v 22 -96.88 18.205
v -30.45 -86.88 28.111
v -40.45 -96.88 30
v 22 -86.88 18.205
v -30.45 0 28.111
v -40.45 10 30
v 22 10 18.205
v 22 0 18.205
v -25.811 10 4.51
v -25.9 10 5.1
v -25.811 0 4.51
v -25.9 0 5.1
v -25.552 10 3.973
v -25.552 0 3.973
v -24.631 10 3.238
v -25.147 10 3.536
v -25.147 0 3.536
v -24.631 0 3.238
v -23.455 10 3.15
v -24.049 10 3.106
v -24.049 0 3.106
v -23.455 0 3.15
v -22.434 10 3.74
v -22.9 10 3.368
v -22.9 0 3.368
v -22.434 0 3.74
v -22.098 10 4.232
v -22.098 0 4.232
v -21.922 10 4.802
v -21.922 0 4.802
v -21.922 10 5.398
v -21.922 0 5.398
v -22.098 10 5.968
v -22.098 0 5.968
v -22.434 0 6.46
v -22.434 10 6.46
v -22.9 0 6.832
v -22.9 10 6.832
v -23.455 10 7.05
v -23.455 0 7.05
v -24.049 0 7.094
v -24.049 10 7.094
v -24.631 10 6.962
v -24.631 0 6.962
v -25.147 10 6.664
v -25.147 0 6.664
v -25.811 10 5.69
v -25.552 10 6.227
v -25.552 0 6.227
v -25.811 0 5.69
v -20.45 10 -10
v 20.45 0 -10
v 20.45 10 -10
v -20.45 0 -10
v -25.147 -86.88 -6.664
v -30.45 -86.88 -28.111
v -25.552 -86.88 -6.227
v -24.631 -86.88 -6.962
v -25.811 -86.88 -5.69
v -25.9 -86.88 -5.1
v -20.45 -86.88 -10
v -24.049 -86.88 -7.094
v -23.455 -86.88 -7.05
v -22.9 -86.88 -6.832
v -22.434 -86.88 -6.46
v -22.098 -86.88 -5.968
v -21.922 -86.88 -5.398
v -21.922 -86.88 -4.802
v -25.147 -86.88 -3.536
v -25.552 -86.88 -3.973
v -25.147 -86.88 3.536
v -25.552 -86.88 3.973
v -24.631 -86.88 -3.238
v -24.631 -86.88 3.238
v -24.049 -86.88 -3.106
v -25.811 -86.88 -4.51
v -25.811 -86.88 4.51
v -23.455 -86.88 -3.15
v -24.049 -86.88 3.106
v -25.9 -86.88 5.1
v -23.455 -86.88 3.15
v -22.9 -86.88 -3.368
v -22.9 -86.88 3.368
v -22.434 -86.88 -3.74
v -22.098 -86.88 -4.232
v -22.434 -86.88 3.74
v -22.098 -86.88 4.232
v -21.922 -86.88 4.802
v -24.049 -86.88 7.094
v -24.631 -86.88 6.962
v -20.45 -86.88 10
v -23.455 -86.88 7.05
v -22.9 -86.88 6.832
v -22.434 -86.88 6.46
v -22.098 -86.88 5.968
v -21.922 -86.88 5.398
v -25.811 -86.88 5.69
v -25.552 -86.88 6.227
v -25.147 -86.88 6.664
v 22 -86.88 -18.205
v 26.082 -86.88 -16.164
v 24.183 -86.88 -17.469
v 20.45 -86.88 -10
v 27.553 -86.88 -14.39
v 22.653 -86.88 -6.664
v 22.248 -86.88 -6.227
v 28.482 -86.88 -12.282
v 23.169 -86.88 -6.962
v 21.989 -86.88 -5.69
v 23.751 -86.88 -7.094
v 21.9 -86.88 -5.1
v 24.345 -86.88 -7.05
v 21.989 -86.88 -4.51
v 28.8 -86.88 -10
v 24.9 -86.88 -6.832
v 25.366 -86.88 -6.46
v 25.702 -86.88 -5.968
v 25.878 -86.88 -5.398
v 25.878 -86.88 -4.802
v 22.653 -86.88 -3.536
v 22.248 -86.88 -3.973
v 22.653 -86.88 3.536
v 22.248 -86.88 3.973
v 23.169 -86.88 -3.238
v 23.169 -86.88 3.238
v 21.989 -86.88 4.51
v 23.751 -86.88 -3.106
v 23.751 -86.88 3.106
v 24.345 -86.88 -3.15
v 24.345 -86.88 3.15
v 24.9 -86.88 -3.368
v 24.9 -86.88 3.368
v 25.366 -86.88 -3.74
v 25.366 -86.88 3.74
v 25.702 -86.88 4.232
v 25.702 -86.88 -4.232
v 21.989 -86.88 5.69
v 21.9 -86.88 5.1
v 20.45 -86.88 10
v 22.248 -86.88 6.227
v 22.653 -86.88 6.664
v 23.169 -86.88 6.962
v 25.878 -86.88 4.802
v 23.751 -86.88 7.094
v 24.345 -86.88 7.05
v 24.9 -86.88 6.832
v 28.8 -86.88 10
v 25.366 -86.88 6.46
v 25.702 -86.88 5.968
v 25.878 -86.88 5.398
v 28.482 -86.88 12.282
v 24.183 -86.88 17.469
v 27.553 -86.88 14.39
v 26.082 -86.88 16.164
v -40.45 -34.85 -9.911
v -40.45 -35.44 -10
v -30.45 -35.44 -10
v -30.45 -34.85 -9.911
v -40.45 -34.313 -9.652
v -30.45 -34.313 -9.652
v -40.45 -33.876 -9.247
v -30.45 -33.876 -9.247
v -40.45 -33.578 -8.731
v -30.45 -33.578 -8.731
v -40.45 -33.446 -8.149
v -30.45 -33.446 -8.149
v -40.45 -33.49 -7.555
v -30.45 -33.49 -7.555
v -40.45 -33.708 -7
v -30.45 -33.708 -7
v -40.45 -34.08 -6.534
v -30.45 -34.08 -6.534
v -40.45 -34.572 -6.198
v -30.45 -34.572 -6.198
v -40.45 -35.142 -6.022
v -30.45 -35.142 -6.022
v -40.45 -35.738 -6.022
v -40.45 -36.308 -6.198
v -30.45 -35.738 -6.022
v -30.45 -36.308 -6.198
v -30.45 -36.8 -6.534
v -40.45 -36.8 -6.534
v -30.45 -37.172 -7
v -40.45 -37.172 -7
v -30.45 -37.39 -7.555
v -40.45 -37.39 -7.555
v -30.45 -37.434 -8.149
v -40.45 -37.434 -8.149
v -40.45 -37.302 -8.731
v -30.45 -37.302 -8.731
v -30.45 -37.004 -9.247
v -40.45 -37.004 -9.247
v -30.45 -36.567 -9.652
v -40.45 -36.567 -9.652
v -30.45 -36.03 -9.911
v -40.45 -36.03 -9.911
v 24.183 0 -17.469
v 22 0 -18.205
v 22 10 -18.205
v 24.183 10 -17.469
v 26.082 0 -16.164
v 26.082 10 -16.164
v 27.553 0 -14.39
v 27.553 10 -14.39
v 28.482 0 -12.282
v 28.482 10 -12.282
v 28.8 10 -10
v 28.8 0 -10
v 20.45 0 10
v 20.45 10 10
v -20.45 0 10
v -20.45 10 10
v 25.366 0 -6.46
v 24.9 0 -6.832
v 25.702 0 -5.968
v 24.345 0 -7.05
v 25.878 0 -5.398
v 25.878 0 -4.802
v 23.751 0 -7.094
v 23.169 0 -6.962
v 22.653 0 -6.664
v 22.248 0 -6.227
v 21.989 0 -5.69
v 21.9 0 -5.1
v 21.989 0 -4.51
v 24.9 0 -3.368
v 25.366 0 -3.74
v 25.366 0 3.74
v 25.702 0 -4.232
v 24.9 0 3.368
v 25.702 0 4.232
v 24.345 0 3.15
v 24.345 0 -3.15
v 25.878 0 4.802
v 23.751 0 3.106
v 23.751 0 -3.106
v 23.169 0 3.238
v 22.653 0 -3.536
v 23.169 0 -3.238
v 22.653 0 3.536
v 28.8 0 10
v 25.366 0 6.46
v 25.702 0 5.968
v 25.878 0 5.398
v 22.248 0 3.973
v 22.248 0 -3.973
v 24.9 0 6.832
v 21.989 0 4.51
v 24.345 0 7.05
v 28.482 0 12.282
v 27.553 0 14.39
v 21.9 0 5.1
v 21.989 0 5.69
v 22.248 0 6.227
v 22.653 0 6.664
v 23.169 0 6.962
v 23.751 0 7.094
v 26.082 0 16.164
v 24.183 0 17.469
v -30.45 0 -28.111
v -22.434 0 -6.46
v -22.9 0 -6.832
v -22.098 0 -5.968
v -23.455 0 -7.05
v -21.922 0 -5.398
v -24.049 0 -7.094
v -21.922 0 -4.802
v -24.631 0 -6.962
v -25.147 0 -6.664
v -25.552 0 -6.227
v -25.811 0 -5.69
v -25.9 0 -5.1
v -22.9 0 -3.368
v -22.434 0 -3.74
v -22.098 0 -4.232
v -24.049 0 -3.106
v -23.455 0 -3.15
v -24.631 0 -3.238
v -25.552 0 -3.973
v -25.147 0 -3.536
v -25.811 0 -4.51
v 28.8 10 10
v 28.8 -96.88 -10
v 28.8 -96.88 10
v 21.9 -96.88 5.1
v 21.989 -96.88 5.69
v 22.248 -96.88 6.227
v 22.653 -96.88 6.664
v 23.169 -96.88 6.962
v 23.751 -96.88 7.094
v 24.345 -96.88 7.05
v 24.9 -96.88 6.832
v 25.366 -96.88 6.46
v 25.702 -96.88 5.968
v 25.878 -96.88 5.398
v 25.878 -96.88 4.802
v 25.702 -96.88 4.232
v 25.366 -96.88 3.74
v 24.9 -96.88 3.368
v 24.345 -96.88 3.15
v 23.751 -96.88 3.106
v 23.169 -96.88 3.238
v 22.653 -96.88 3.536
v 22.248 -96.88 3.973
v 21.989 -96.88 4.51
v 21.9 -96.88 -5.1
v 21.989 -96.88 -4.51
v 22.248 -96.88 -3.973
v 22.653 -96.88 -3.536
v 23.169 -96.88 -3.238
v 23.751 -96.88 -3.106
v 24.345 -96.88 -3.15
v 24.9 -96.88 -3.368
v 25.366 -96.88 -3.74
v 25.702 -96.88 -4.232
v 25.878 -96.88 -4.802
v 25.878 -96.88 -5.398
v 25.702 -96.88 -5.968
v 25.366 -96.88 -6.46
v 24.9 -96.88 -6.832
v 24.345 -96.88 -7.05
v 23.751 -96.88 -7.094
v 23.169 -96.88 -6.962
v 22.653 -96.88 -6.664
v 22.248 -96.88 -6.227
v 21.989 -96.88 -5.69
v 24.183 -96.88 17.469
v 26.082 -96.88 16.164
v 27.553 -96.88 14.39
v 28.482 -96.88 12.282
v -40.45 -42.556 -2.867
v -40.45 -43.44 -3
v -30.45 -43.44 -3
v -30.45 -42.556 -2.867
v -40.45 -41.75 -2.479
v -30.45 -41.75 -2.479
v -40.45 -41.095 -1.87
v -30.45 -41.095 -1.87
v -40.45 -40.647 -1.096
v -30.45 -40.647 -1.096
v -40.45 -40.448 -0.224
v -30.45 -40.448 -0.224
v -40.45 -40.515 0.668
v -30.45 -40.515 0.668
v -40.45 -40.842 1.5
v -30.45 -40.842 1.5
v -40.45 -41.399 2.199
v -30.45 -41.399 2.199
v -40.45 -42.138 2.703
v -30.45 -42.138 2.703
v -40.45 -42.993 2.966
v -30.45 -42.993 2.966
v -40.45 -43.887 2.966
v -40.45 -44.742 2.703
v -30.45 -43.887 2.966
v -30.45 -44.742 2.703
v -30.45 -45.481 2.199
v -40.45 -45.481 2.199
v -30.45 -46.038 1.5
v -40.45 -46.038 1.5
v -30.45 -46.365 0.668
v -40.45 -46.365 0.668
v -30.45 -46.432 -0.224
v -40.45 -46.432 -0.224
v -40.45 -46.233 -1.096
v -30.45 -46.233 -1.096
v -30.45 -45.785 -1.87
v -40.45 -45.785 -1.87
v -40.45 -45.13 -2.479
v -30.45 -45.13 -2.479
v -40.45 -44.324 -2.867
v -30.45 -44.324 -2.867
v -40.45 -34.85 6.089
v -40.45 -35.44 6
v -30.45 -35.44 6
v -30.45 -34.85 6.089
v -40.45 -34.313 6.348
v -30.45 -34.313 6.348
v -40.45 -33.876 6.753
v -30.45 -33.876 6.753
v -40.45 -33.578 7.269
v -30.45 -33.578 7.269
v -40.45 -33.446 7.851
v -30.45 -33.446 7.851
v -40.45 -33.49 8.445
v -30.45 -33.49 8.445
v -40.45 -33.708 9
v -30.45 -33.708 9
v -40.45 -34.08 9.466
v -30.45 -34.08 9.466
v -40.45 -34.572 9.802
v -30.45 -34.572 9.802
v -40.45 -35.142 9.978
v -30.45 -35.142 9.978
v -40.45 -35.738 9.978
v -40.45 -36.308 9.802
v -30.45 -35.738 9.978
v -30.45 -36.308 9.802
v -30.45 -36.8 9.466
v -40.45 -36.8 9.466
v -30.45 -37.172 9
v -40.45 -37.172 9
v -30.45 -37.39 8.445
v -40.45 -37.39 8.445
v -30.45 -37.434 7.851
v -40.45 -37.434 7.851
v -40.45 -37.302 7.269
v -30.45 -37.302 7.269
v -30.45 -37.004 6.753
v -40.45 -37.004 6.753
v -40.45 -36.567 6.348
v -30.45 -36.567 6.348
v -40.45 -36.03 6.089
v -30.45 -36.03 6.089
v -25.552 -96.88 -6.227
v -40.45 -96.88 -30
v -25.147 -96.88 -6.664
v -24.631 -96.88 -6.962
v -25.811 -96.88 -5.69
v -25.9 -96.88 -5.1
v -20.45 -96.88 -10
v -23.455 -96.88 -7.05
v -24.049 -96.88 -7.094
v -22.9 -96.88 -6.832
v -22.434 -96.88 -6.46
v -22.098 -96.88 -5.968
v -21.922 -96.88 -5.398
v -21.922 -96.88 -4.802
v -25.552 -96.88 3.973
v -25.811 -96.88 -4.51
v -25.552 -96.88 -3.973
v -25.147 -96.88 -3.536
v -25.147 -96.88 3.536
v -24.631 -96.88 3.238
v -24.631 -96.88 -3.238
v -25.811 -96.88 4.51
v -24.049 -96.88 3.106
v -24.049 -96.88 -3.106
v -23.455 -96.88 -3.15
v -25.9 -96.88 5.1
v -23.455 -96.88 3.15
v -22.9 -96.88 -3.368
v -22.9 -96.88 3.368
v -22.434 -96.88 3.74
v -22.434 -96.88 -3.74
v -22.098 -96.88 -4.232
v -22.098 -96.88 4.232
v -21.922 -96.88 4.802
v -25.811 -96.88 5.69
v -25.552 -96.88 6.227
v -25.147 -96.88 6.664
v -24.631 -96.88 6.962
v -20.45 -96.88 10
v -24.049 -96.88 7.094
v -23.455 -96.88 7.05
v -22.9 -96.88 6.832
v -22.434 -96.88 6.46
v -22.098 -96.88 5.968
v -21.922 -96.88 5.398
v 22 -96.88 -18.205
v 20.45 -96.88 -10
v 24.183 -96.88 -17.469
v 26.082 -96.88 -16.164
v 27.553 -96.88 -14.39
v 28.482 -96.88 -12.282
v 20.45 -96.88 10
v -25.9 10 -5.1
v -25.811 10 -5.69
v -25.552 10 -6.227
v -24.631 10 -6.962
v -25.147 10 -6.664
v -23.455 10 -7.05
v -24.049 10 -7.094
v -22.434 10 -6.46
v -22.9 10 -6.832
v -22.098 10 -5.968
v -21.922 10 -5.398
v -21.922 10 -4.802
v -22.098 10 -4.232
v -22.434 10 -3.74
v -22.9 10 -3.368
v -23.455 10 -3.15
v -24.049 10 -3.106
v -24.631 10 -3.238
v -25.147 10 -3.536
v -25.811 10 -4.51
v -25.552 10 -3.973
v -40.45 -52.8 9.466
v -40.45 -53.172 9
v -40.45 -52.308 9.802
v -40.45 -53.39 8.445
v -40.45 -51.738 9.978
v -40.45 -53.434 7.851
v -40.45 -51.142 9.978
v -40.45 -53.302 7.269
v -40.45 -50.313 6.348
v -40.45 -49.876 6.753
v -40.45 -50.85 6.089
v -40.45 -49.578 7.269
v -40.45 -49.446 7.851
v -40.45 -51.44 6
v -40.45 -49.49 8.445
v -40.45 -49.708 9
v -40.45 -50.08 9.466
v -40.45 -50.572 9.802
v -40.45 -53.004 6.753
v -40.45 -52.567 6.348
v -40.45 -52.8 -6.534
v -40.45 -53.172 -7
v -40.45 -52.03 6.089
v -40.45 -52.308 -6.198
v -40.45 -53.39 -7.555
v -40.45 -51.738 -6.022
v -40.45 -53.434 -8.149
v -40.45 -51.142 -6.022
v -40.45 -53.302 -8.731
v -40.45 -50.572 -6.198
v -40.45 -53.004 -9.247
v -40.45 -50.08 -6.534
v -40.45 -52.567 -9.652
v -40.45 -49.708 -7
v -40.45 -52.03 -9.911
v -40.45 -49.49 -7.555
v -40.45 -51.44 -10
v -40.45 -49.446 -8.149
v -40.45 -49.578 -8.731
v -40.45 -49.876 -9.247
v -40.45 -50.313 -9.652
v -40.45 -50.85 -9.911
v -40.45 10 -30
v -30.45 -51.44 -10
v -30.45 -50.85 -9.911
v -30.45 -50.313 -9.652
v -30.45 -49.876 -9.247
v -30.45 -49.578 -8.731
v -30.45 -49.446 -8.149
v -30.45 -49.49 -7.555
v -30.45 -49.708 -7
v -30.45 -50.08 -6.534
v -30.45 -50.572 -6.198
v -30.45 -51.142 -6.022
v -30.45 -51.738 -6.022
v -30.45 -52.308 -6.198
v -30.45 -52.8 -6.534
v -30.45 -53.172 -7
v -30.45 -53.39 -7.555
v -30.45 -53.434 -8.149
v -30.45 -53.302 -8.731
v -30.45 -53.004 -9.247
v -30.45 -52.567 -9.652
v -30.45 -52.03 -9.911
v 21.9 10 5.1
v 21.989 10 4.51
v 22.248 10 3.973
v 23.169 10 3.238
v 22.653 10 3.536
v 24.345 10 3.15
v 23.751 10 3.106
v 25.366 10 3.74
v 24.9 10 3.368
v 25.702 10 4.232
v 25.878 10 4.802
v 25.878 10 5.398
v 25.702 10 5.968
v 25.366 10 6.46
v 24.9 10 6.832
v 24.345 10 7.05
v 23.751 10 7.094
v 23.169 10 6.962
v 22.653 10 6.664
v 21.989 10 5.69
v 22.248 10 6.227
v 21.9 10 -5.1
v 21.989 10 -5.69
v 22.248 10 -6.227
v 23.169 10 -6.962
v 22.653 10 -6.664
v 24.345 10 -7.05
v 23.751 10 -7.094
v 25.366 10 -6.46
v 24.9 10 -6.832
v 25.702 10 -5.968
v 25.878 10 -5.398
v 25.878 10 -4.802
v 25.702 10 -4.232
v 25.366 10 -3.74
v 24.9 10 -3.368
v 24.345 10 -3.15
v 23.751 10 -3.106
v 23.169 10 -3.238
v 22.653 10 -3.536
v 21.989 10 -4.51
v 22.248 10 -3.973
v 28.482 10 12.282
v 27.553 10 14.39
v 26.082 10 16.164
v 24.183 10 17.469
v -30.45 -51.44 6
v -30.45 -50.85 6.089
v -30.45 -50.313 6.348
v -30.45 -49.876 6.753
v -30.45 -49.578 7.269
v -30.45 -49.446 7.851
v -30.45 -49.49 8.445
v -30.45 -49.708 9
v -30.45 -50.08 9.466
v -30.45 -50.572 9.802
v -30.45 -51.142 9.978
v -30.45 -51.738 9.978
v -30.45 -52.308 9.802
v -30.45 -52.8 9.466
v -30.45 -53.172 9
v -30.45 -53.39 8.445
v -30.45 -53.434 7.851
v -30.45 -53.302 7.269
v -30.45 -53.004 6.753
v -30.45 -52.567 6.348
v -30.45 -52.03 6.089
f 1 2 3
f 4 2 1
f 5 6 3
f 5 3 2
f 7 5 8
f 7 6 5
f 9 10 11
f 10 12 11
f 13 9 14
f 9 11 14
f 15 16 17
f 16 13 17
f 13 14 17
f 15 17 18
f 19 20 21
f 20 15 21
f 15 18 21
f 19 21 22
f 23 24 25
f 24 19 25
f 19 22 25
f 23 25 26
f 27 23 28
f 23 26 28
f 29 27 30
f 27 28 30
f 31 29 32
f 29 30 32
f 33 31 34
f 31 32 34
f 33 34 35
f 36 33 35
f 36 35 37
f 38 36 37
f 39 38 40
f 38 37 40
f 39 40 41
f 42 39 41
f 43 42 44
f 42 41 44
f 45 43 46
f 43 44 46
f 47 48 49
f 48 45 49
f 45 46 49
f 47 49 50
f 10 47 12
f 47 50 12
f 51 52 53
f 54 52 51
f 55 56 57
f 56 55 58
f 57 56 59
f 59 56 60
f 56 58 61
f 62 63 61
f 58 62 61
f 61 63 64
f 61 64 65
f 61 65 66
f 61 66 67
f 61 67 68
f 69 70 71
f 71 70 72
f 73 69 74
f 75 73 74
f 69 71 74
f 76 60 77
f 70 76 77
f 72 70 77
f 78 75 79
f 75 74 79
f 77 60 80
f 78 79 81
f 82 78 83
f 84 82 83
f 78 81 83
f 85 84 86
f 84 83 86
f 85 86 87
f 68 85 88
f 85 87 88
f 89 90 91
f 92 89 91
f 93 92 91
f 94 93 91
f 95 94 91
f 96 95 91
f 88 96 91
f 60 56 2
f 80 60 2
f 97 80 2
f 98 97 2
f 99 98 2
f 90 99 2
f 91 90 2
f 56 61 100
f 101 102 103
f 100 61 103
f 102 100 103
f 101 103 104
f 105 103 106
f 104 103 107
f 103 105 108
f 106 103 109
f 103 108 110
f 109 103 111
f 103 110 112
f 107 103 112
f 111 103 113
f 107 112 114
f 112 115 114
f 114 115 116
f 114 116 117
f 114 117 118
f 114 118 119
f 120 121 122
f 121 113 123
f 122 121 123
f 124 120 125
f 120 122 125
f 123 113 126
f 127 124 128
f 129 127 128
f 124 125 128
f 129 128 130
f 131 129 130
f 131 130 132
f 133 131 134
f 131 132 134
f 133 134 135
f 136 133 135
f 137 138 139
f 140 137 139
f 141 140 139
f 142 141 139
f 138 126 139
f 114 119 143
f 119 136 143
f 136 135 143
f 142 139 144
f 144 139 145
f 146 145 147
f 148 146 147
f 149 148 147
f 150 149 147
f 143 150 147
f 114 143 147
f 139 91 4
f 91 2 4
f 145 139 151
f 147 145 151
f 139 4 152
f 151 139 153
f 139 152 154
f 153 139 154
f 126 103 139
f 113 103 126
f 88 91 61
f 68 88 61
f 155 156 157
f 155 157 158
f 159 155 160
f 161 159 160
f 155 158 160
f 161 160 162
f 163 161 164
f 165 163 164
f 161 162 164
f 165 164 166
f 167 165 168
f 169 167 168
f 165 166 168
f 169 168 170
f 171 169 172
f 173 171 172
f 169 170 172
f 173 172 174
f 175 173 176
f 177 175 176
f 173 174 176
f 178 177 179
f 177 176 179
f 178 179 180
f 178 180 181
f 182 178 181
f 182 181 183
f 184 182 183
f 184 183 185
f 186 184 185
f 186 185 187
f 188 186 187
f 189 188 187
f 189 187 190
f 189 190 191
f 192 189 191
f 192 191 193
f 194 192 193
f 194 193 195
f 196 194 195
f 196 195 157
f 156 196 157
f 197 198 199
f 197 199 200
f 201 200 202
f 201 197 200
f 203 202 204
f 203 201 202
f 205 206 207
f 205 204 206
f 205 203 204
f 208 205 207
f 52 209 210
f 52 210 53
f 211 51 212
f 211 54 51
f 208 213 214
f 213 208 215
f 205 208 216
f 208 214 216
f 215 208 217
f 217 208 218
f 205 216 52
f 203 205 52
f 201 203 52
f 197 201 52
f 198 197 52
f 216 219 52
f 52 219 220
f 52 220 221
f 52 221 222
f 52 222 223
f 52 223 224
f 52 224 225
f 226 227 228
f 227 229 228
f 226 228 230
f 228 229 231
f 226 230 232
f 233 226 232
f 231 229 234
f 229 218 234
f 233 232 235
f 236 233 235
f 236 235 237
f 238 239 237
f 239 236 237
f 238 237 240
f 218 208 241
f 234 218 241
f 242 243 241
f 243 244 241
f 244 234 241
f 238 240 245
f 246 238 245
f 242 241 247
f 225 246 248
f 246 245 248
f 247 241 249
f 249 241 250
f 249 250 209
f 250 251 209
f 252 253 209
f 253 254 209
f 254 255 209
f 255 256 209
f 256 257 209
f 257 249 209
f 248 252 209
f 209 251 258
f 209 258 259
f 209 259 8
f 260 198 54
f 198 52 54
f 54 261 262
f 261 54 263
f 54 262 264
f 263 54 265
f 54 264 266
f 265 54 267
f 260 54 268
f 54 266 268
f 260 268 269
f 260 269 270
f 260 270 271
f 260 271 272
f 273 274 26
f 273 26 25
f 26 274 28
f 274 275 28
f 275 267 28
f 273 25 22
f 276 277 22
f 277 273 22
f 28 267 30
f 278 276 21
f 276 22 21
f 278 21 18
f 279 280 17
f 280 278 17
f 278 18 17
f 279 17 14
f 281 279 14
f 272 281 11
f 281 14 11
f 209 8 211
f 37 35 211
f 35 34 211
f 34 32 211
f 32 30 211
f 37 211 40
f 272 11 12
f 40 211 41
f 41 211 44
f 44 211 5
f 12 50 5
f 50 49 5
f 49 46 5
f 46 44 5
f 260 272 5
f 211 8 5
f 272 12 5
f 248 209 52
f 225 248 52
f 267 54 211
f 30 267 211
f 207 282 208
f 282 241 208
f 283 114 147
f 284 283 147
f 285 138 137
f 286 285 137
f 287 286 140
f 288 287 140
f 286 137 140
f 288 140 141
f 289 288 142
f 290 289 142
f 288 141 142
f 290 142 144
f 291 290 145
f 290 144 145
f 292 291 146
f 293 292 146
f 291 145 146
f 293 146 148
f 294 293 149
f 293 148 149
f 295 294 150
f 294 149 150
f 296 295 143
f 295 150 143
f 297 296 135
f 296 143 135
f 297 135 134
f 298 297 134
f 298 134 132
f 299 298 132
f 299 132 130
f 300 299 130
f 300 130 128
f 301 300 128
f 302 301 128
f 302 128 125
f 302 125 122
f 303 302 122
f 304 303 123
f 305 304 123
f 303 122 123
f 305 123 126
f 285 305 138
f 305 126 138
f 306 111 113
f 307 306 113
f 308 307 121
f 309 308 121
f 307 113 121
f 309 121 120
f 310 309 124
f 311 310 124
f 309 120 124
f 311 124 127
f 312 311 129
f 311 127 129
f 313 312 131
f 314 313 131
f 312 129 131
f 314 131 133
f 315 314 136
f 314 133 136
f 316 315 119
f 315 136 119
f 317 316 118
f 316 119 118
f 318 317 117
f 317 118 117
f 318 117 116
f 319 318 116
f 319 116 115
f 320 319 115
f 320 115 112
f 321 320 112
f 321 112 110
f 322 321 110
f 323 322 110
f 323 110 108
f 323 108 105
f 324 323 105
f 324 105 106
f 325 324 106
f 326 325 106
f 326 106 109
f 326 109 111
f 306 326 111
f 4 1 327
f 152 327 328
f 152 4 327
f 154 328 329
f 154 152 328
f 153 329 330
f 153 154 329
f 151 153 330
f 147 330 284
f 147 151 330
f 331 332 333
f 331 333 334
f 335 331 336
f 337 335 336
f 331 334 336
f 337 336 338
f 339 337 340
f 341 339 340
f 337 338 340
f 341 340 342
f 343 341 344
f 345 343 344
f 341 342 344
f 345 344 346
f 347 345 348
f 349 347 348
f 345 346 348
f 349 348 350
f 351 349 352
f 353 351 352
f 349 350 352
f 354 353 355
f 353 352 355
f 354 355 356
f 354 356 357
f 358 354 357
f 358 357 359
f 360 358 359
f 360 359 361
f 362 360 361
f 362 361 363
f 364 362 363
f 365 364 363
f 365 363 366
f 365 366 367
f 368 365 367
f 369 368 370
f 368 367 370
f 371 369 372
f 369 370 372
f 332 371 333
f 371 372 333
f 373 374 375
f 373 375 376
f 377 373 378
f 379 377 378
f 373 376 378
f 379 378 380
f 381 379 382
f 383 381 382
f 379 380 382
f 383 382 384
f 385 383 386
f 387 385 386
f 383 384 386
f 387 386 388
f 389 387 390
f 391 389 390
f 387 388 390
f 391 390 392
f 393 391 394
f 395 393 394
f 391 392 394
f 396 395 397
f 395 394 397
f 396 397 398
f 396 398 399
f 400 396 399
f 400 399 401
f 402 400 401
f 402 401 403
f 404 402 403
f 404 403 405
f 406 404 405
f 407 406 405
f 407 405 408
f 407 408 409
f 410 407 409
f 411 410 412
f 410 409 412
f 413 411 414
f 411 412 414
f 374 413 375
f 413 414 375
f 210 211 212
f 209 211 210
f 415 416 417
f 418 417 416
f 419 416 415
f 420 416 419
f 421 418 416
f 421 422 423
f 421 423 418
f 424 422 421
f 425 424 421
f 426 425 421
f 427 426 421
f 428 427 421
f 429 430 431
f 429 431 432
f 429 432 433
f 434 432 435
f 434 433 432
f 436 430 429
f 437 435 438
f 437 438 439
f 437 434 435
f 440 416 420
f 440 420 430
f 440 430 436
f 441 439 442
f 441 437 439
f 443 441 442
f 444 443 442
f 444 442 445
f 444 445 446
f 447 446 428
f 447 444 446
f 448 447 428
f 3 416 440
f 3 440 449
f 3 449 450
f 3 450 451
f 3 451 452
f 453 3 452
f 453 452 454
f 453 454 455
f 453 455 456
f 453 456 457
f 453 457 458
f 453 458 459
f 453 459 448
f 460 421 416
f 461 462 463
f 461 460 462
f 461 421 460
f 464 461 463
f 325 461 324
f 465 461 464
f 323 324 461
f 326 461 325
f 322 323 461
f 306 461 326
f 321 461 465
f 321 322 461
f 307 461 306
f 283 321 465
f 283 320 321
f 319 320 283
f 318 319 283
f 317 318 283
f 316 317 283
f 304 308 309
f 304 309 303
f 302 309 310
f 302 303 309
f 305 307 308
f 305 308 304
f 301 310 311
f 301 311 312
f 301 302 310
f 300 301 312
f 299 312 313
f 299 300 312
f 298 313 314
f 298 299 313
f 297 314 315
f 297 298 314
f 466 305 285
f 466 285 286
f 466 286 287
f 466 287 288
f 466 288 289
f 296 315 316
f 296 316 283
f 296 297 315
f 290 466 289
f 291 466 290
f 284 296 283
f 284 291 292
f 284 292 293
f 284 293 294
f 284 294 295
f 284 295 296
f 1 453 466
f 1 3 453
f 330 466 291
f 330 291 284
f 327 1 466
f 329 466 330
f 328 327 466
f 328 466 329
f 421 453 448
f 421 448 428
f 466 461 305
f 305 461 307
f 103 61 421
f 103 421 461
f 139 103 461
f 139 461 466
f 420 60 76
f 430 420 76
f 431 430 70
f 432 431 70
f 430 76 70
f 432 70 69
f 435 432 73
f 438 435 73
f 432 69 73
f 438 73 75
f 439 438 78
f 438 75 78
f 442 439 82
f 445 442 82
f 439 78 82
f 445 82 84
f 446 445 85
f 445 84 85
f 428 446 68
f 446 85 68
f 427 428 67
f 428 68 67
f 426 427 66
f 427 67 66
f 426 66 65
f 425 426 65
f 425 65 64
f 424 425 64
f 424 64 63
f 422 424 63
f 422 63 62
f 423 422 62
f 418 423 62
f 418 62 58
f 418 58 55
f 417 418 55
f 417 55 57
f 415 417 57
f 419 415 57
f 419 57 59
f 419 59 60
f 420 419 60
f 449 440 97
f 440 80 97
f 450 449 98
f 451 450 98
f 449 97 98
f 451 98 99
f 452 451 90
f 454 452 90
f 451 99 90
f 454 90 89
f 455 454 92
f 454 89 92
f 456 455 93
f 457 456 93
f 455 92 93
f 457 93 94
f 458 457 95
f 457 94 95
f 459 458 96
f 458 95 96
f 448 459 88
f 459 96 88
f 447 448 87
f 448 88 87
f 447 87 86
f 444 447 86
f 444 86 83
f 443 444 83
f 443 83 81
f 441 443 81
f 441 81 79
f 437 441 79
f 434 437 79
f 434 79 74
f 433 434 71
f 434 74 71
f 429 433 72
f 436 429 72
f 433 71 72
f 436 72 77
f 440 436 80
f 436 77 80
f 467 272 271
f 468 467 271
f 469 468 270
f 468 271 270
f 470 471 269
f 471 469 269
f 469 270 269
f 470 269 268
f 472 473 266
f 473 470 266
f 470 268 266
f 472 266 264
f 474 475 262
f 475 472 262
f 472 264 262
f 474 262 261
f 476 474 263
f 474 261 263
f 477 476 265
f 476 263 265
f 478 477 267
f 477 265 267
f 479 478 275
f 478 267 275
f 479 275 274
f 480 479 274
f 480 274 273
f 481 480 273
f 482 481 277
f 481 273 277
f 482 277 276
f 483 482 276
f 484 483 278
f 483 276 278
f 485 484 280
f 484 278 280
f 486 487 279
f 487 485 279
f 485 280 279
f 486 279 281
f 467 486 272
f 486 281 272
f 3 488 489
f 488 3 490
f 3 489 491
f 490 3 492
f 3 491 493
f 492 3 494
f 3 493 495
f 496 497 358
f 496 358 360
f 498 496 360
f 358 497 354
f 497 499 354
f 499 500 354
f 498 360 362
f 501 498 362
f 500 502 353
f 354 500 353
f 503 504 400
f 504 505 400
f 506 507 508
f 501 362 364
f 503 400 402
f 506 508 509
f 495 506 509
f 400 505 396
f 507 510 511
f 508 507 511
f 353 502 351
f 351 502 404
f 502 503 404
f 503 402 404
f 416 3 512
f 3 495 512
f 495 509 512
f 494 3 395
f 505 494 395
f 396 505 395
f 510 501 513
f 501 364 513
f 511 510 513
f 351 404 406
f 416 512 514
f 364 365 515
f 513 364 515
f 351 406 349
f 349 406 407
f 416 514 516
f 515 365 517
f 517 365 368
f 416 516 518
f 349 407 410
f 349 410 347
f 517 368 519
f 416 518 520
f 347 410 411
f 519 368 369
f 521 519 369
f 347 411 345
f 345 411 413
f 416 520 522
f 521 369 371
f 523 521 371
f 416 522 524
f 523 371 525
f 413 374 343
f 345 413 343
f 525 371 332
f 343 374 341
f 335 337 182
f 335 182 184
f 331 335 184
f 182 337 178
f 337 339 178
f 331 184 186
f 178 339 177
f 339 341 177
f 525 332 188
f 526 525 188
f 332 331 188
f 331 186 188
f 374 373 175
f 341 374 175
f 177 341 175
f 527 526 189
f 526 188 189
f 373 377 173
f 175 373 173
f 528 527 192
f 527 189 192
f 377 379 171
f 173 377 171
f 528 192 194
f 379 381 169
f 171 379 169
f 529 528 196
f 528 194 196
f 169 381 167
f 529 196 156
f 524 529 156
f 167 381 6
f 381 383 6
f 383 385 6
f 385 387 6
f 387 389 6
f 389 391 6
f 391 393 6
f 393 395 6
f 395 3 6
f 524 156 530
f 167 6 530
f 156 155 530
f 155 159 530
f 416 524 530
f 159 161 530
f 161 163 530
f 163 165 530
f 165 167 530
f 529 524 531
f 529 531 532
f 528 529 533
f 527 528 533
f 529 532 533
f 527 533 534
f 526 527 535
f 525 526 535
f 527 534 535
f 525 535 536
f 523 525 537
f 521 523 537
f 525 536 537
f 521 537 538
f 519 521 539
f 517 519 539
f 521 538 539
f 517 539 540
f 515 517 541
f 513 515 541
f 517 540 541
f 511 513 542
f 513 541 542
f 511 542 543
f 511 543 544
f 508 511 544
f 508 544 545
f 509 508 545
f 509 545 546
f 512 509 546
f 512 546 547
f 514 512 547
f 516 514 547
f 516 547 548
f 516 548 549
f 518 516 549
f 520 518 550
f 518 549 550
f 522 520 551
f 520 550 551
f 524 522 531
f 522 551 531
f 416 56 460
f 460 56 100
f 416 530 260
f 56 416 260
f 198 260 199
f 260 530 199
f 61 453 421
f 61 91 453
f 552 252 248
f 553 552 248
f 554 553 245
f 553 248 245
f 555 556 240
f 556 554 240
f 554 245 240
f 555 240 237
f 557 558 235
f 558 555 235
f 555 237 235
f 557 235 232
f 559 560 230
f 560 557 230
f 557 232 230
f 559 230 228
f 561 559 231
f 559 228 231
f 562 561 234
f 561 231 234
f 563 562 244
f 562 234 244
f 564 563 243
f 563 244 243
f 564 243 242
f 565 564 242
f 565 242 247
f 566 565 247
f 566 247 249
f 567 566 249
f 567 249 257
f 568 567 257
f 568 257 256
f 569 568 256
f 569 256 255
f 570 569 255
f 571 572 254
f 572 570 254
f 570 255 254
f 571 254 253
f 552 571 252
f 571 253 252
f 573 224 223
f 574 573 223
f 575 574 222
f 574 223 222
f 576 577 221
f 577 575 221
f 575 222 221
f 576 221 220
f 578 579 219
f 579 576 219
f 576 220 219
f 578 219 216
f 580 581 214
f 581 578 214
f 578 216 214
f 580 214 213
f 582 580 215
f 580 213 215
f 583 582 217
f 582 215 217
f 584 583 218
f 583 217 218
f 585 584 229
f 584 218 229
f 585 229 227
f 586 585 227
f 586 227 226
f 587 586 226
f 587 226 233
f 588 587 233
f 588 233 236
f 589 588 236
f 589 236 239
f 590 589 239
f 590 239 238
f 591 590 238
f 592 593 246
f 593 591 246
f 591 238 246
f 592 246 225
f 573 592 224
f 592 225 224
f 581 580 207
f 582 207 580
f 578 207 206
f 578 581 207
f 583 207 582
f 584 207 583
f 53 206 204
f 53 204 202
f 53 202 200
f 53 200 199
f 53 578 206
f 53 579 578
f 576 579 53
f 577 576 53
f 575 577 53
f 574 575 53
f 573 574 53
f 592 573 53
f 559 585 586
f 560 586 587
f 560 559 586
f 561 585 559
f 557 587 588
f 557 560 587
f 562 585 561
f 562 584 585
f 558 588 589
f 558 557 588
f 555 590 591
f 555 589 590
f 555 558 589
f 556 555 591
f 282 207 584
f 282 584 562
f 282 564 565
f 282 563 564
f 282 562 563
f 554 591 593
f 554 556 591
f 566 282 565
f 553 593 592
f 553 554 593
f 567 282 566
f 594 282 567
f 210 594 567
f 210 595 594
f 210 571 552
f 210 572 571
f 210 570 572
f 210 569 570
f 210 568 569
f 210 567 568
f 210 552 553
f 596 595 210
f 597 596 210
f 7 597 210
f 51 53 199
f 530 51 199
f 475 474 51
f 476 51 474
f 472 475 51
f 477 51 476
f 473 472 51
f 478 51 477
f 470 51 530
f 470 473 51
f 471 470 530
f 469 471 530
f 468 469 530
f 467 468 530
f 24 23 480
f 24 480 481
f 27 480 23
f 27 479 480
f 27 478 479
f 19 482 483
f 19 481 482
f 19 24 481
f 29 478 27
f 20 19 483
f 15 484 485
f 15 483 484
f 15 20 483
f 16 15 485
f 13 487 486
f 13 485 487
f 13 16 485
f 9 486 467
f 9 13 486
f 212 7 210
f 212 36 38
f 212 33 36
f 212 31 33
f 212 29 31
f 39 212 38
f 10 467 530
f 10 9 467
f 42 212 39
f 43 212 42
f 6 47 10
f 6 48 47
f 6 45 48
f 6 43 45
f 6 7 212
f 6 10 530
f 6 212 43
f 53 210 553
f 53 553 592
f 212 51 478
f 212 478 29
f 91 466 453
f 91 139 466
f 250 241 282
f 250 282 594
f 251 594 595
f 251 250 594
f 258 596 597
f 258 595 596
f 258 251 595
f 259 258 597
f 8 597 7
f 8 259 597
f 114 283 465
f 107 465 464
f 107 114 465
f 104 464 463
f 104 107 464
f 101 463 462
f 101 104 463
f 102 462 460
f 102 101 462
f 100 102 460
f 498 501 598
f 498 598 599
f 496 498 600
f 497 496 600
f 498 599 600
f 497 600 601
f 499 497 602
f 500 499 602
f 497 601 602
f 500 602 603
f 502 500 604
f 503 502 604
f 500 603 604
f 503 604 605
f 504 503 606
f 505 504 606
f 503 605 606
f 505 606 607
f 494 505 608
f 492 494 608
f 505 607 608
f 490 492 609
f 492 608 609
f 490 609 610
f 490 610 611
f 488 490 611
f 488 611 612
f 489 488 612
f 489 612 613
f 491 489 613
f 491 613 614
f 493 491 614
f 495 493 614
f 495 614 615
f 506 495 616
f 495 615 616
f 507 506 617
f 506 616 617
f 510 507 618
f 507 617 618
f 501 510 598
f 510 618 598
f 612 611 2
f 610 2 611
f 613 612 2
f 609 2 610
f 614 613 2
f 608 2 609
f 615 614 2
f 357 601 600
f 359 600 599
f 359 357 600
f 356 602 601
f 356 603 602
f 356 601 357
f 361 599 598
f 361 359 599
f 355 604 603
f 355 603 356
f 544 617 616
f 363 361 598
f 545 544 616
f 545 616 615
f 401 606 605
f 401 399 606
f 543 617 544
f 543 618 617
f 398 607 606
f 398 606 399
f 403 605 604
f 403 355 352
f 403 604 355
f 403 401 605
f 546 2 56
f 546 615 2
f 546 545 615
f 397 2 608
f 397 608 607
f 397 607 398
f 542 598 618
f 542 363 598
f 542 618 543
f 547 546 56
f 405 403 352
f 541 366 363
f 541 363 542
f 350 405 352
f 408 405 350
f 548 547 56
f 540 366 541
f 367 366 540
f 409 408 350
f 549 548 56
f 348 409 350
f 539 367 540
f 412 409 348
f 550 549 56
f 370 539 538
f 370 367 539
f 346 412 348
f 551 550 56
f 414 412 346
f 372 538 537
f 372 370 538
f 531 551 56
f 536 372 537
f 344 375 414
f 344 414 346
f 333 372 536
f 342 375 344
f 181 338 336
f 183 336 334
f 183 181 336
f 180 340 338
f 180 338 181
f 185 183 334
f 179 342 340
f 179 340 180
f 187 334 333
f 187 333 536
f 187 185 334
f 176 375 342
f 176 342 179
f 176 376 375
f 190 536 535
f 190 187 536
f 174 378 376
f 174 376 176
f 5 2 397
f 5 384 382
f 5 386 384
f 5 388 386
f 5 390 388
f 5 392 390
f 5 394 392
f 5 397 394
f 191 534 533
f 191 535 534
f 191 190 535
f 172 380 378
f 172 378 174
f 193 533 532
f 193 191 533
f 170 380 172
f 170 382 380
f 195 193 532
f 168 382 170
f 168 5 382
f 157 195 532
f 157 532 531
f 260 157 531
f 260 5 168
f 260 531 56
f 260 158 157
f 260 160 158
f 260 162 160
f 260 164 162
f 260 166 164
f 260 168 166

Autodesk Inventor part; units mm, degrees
ref_plane "YZ Plane" through (0, 0, 0) normal (1, 0, 0) x (0, 1, 0)
ref_plane "XZ Plane" through (0, 0, 0) normal (0, 1, 0) x (-1, 0, 0)
sketch "Sketch1" plane through (0, 0, 0) normal (0, 1, 0) x (-1, 0, 0)
  line L0 (20.45, 10) -> (-20.45, 10)
  line L1 (-20.45, 10) -> (-20.45, -10)
  line L2 (-20.45, -10) -> (20.45, -10)
  line L3 (20.45, -10) -> (20.45, 10)
  line L4 (20.45, 10) -> (-20.45, -10) construction
  line L5 (-20.45, 10) -> (20.45, -10) construction
  line L6 (-20.45, 10) -> (-23.9, 10)
  line L7 (-23.9, 10) -> (-23.9, 5.1) construction
  circle A0 centre (-23.9, 5.1) radius 2
  line L8 (-23.9, 5.1) -> (-20.45, 5.1) construction
  line L9 (0, 0) -> (-20.45, 0) construction
  line L10 (-20.45, -10) -> (-23.9, -10)
  line L11 (-23.9, -10) -> (-23.9, -5.1) construction
  circle A1 centre (-23.9, -5.1) radius 2
  line L12 (-23.9, -5.1) -> (-20.45, -5.1) construction
  arc A2 (-28.8, -10) -> (-21.9997, -18.2049) centre (-20.45, -10) ccw
  line L13 (-28.8, 0) -> (-28.8, -10)
  line L14 (0, 0) -> (0, -10) construction
  circle A3 centre (23.9, 5.1) radius 2
  line L15 (23.9, 5.1) -> (20.45, 5.1) construction
  circle A4 centre (23.9, -5.1) radius 2
  line L16 (23.9, -5.1) -> (20.45, -5.1) construction
  line L17 (40.45, -30) -> (-21.9997, -18.2049)
  line L18 (0, 0) -> (-20.45, 0) construction
  line L19 (30.45, 0) -> (30.45, -28.1113)
  line L20 (40.45, -28.1113) -> (40.45, 0)
  line L21 (40.45, 0) -> (40.45, -30)
  arc A5 (-21.9997, 18.2049) -> (-28.8, 10) centre (-20.45, 10) ccw
  line L22 (40.45, 30) -> (-21.9997, 18.2049)
  line L23 (30.45, 0) -> (30.45, 28.1113)
  line L24 (40.45, 28.1113) -> (40.45, 0)
  line L25 (40.45, 0) -> (40.45, 30)
  line L26 (-28.8, 10) -> (-28.8, 0)
  point P0 (20.45, 0)
  dimension "d0" = 40.9
  dimension "d1" = 20
  dimension "d2" = 3.45
  dimension "d3" = 4.9
  dimension "d4" = 4
  dimension "d10" = 10
extrude "Extrusion1" add sketch "Sketch1" along normal blind 10
ref_plane "Work Plane1" through (0, -43.44, 0) normal (0, -1, 0) x (1, 0, 0)
mirror "Mirror1" about plane through (0, -43.44, 0) normal (0, -1, 0) of "Extrusion1"
extrude "Extrusion2" add sketch "Sketch1" against normal blind 86.88 contours L19 L23 L22 L25 L24 L20 L21 L17
sketch "Sketch2" plane through (-30.45, -86.88, 28.1113) normal (1, 0, 0) x (0, 0, -1)
  line L0 (56.2225, 86.88) -> (56.2225, 0) projected
  line L1 (0, 0) -> (56.2225, 0)
  line L2 (56.2225, 0) -> (56.2225, 86.88)
  line L3 (56.2225, 86.88) -> (0, 86.88)
  line L4 (0, 86.88) -> (0, 0)
  line L5 (0, 86.88) -> (0, 0) construction
  line L6 (0, 0) -> (56.2225, 86.88) construction
  circle A0 centre (28.1113, 43.44) radius 3
  line L7 (20.1113, 35.44) -> (36.1113, 35.44) construction
  line L8 (36.1113, 35.44) -> (36.1113, 51.44) construction
  line L9 (36.1113, 51.44) -> (20.1113, 51.44) construction
  line L10 (20.1113, 51.44) -> (20.1113, 35.44) construction
  line L11 (20.1113, 35.44) -> (36.1113, 51.44) construction
  line L12 (36.1113, 35.44) -> (20.1113, 51.44) construction
  circle A1 centre (20.1113, 51.44) radius 2
  circle A2 centre (20.1113, 35.44) radius 2
  circle A3 centre (36.1113, 35.44) radius 2
  circle A4 centre (36.1113, 51.44) radius 2
  point P0 (28.1113, 86.88)
  dimension "d13" = 6
  dimension "d24" = 16
  dimension "d25" = 4
extrude "Extrusion3" cut sketch "Sketch2" against normal blind 10 contours A0 | A1 | A2 | A3 | A4
properties part number "Hand-End Fork" material "Acrylic, Clear"
